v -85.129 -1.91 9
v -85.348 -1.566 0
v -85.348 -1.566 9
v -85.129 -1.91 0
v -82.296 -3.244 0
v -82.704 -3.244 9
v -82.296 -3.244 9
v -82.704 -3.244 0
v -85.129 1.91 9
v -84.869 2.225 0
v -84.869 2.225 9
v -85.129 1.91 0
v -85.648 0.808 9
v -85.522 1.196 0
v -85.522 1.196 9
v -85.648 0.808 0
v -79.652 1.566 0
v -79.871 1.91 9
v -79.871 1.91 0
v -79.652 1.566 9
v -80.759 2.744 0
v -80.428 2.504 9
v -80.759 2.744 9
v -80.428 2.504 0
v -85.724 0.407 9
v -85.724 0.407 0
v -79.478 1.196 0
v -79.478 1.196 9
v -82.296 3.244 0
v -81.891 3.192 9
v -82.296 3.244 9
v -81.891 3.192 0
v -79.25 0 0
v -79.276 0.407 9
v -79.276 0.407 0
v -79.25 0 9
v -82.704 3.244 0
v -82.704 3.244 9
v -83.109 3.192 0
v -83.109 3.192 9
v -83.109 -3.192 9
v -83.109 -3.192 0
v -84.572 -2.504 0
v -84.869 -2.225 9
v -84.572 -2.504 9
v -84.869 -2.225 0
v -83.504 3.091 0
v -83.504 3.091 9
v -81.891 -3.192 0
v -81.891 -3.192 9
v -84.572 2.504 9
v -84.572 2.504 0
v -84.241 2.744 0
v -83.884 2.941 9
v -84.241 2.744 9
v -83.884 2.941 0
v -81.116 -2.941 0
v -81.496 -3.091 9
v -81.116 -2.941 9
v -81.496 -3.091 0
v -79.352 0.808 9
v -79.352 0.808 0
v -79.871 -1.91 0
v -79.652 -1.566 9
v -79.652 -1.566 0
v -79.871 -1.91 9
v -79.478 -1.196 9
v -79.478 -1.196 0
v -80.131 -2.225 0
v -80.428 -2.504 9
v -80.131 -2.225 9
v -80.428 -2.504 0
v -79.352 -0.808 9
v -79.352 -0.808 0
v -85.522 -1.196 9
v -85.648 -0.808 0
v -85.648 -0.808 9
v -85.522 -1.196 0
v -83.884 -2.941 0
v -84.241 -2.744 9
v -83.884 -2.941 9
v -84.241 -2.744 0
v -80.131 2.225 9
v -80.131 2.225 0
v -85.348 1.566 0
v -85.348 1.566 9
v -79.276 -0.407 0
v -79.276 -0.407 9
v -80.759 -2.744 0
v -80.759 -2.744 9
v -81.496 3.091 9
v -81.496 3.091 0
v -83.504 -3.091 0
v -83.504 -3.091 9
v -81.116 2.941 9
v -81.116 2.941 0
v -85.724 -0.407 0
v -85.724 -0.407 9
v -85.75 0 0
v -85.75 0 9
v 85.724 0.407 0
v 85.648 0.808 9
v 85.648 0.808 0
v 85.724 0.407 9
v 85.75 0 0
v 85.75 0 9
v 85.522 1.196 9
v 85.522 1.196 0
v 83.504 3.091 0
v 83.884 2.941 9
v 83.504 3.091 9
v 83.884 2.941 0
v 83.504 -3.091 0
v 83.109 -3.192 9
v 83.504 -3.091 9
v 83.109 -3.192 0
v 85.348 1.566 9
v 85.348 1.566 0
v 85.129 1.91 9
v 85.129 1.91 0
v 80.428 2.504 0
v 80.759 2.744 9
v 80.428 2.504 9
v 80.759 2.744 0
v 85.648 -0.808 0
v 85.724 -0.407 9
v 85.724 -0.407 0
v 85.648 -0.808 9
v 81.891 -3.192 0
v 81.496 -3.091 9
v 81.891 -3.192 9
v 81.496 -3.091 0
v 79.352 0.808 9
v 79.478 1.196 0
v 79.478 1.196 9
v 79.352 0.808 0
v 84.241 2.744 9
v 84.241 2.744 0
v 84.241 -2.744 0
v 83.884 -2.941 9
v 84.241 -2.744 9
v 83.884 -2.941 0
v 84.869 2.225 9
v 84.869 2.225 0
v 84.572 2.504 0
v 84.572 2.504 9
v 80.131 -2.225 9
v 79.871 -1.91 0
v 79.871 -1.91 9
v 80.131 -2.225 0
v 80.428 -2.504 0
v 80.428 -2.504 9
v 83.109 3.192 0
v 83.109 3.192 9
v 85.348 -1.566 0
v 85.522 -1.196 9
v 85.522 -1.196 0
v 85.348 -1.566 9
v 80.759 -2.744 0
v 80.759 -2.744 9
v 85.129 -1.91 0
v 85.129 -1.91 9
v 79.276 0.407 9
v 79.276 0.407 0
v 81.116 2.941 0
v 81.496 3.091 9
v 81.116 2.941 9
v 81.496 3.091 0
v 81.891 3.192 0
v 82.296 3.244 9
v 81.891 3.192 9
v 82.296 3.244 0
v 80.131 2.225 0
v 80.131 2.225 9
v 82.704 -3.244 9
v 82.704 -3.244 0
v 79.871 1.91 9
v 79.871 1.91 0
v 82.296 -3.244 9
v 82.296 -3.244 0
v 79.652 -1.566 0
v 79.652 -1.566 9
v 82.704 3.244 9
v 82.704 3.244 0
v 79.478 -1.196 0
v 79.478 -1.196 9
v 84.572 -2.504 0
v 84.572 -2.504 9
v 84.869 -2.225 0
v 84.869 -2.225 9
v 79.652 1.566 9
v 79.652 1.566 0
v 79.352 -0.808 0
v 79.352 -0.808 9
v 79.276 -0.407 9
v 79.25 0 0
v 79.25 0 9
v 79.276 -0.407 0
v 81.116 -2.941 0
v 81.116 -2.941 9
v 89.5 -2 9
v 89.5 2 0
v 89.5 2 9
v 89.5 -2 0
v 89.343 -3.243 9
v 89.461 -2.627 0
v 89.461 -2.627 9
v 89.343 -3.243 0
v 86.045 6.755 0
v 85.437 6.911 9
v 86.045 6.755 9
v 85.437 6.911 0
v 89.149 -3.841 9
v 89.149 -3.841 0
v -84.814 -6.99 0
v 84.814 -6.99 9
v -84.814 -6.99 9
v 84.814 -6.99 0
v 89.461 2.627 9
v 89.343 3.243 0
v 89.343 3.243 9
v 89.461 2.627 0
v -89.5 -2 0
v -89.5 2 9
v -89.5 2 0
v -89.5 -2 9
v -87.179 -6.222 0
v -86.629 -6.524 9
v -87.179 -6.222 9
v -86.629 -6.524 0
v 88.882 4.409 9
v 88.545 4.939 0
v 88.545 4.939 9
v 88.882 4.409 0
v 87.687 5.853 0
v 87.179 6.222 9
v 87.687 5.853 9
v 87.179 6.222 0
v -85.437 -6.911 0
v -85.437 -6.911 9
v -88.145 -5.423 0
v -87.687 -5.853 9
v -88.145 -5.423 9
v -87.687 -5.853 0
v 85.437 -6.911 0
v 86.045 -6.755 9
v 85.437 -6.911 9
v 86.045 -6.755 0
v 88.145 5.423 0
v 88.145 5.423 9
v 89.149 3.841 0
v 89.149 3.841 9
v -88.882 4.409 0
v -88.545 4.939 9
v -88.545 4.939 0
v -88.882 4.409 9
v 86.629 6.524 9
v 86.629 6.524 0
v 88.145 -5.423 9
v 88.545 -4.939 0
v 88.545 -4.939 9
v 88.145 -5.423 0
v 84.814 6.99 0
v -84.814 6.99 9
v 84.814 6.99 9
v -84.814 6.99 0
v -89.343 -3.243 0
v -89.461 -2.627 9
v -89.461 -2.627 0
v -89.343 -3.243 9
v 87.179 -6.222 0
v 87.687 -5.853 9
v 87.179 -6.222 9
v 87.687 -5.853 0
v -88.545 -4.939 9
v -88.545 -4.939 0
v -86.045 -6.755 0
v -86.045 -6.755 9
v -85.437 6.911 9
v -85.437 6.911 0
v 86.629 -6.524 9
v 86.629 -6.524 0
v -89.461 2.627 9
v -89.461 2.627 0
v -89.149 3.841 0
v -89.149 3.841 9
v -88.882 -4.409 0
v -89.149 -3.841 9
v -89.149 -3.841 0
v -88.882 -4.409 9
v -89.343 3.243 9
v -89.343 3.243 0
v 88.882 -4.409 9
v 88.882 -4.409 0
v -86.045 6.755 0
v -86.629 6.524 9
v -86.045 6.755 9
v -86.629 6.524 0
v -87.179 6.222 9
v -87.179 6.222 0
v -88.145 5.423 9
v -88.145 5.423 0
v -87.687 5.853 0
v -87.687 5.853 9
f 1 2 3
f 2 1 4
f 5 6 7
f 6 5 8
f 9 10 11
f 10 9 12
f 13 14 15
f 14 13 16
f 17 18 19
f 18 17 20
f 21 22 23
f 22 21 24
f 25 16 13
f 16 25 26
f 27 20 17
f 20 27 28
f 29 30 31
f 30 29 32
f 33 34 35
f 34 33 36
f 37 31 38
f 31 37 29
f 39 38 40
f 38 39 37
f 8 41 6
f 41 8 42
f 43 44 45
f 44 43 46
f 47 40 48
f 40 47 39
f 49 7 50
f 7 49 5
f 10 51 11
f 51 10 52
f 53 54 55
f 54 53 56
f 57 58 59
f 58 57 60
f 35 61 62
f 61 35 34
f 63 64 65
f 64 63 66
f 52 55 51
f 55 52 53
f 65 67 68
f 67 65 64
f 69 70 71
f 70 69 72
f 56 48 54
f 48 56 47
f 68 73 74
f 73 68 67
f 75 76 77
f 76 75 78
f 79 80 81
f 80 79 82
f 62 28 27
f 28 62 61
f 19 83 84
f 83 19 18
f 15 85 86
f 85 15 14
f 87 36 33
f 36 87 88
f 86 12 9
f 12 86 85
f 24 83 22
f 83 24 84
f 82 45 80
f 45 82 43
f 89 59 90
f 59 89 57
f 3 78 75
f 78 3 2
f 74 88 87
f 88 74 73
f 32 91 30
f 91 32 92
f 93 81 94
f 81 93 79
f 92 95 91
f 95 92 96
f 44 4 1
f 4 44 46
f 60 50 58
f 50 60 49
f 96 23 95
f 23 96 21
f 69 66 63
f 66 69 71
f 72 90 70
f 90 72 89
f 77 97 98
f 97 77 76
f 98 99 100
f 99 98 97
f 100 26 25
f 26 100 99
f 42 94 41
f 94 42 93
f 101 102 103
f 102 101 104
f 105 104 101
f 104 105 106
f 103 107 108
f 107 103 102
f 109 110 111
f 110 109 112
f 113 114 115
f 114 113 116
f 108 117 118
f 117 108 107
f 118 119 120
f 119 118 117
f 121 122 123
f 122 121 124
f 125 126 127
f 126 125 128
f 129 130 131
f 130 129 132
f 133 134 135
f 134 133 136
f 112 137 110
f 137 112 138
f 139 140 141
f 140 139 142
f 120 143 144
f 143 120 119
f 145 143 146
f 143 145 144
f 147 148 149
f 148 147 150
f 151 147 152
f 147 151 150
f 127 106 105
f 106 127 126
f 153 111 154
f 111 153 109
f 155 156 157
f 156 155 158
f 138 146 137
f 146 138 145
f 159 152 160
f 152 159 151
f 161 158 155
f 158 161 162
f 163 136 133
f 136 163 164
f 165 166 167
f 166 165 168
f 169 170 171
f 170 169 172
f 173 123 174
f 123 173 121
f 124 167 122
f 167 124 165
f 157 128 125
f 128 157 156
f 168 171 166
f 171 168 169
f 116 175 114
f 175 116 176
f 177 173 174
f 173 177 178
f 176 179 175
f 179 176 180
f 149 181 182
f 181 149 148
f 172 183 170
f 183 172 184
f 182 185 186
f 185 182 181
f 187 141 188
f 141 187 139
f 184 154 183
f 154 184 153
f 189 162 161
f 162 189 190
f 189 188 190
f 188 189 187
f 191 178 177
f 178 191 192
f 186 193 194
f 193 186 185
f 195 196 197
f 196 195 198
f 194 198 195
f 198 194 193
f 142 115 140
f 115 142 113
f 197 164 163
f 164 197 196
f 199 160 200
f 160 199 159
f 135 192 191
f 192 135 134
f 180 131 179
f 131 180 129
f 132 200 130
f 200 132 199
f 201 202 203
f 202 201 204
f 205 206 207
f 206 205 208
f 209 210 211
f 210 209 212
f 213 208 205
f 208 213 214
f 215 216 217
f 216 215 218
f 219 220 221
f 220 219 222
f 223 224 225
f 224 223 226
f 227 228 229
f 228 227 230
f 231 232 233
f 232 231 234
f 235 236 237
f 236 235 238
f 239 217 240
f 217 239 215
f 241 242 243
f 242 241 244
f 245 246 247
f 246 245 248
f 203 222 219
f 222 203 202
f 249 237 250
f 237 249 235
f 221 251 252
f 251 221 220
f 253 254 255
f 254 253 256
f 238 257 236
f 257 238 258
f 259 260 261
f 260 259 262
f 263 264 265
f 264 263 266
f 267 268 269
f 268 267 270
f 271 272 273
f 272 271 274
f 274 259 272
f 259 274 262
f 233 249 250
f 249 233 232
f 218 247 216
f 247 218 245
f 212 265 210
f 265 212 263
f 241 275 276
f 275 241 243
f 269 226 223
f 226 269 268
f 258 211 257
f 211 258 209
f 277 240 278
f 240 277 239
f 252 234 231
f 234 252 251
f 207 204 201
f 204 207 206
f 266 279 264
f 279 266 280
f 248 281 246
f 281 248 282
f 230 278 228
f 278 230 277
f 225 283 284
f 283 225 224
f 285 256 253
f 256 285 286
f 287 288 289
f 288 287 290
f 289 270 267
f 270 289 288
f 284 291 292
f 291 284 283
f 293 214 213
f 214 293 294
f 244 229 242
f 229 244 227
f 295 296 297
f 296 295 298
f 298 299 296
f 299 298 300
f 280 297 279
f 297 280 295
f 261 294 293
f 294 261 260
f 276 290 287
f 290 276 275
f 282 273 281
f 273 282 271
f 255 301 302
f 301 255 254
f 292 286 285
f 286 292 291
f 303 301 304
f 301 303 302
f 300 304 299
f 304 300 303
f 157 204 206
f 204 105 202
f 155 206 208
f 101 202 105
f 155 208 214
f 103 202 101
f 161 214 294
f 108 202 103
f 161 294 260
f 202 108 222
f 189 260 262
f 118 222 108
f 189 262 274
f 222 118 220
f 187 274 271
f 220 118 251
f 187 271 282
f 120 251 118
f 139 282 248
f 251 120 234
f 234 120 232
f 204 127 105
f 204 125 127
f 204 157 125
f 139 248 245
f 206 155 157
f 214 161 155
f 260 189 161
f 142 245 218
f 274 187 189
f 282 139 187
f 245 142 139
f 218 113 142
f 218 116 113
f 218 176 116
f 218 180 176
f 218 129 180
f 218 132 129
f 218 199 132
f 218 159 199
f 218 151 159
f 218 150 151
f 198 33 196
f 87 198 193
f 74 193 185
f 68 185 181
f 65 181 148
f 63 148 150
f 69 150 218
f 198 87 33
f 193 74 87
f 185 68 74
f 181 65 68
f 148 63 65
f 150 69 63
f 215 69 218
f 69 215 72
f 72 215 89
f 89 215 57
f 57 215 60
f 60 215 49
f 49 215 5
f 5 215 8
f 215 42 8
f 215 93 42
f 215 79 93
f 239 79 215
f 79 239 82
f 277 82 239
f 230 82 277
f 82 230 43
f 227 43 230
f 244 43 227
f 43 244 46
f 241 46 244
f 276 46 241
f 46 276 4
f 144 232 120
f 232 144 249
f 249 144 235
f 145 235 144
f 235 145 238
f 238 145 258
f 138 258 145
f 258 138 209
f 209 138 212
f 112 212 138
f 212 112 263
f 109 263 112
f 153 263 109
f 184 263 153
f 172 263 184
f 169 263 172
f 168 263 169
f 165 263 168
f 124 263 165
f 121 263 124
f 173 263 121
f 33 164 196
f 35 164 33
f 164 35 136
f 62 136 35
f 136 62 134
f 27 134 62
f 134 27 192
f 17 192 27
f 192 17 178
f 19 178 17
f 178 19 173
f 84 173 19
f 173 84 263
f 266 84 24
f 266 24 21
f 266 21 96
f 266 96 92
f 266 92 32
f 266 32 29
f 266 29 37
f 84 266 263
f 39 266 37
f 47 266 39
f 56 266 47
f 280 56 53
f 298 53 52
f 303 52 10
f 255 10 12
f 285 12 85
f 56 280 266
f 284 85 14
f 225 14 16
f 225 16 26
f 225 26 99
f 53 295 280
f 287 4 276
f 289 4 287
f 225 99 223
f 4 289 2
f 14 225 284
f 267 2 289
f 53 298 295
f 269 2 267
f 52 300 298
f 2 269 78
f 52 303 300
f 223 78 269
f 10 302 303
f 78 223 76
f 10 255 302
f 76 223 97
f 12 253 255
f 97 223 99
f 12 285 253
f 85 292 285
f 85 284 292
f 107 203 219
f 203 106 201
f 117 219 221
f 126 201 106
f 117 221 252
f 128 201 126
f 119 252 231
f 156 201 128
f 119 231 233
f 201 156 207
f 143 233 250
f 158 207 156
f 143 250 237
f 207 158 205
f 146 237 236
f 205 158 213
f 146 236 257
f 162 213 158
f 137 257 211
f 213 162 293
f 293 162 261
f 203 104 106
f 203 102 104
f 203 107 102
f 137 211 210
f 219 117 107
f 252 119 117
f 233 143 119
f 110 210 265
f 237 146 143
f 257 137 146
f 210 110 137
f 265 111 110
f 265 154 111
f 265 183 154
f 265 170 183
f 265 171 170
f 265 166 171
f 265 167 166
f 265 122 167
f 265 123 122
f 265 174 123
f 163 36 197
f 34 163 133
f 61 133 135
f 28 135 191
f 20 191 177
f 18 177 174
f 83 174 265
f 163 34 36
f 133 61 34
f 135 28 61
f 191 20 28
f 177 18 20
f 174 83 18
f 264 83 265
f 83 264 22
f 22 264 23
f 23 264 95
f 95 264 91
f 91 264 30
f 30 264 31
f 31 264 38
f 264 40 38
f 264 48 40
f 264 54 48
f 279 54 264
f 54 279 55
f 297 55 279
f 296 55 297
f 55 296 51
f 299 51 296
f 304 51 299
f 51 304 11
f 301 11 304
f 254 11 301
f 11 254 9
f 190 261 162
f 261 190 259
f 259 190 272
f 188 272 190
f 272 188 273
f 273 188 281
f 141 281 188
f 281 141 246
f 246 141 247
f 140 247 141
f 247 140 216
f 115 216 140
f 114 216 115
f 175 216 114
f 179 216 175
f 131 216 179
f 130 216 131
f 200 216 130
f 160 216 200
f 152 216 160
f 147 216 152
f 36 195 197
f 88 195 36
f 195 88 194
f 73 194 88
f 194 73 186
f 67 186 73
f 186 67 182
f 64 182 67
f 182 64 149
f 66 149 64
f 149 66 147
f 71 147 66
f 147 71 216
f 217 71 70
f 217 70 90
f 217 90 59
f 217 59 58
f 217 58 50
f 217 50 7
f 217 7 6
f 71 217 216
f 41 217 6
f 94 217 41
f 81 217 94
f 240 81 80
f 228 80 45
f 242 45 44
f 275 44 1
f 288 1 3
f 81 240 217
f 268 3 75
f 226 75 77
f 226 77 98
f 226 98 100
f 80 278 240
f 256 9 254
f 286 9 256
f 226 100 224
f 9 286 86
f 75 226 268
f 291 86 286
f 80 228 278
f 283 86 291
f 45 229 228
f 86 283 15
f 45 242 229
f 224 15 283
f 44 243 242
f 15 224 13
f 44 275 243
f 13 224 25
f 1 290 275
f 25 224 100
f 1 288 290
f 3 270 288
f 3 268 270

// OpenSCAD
$fn = 50;


difference() {
	union() {
		hull() {
			translate(v = [-84.5000000000, 2.0000000000, 0]) {
				cylinder(h = 9, r = 5);
			}
			translate(v = [84.5000000000, 2.0000000000, 0]) {
				cylinder(h = 9, r = 5);
			}
			translate(v = [-84.5000000000, -2.0000000000, 0]) {
				cylinder(h = 9, r = 5);
			}
			translate(v = [84.5000000000, -2.0000000000, 0]) {
				cylinder(h = 9, r = 5);
			}
		}
	}
	union() {
		translate(v = [-82.5000000000, 0.0000000000, -100.0000000000]) {
			cylinder(h = 200, r = 3.2500000000);
		}
		translate(v = [-82.5000000000, 0.0000000000, -100.0000000000]) {
			cylinder(h = 200, r = 3.2500000000);
		}
		translate(v = [82.5000000000, 0.0000000000, -100.0000000000]) {
			cylinder(h = 200, r = 3.2500000000);
		}
		translate(v = [82.5000000000, 0.0000000000, -100.0000000000]) {
			cylinder(h = 200, r = 3.2500000000);
		}
	}
}
